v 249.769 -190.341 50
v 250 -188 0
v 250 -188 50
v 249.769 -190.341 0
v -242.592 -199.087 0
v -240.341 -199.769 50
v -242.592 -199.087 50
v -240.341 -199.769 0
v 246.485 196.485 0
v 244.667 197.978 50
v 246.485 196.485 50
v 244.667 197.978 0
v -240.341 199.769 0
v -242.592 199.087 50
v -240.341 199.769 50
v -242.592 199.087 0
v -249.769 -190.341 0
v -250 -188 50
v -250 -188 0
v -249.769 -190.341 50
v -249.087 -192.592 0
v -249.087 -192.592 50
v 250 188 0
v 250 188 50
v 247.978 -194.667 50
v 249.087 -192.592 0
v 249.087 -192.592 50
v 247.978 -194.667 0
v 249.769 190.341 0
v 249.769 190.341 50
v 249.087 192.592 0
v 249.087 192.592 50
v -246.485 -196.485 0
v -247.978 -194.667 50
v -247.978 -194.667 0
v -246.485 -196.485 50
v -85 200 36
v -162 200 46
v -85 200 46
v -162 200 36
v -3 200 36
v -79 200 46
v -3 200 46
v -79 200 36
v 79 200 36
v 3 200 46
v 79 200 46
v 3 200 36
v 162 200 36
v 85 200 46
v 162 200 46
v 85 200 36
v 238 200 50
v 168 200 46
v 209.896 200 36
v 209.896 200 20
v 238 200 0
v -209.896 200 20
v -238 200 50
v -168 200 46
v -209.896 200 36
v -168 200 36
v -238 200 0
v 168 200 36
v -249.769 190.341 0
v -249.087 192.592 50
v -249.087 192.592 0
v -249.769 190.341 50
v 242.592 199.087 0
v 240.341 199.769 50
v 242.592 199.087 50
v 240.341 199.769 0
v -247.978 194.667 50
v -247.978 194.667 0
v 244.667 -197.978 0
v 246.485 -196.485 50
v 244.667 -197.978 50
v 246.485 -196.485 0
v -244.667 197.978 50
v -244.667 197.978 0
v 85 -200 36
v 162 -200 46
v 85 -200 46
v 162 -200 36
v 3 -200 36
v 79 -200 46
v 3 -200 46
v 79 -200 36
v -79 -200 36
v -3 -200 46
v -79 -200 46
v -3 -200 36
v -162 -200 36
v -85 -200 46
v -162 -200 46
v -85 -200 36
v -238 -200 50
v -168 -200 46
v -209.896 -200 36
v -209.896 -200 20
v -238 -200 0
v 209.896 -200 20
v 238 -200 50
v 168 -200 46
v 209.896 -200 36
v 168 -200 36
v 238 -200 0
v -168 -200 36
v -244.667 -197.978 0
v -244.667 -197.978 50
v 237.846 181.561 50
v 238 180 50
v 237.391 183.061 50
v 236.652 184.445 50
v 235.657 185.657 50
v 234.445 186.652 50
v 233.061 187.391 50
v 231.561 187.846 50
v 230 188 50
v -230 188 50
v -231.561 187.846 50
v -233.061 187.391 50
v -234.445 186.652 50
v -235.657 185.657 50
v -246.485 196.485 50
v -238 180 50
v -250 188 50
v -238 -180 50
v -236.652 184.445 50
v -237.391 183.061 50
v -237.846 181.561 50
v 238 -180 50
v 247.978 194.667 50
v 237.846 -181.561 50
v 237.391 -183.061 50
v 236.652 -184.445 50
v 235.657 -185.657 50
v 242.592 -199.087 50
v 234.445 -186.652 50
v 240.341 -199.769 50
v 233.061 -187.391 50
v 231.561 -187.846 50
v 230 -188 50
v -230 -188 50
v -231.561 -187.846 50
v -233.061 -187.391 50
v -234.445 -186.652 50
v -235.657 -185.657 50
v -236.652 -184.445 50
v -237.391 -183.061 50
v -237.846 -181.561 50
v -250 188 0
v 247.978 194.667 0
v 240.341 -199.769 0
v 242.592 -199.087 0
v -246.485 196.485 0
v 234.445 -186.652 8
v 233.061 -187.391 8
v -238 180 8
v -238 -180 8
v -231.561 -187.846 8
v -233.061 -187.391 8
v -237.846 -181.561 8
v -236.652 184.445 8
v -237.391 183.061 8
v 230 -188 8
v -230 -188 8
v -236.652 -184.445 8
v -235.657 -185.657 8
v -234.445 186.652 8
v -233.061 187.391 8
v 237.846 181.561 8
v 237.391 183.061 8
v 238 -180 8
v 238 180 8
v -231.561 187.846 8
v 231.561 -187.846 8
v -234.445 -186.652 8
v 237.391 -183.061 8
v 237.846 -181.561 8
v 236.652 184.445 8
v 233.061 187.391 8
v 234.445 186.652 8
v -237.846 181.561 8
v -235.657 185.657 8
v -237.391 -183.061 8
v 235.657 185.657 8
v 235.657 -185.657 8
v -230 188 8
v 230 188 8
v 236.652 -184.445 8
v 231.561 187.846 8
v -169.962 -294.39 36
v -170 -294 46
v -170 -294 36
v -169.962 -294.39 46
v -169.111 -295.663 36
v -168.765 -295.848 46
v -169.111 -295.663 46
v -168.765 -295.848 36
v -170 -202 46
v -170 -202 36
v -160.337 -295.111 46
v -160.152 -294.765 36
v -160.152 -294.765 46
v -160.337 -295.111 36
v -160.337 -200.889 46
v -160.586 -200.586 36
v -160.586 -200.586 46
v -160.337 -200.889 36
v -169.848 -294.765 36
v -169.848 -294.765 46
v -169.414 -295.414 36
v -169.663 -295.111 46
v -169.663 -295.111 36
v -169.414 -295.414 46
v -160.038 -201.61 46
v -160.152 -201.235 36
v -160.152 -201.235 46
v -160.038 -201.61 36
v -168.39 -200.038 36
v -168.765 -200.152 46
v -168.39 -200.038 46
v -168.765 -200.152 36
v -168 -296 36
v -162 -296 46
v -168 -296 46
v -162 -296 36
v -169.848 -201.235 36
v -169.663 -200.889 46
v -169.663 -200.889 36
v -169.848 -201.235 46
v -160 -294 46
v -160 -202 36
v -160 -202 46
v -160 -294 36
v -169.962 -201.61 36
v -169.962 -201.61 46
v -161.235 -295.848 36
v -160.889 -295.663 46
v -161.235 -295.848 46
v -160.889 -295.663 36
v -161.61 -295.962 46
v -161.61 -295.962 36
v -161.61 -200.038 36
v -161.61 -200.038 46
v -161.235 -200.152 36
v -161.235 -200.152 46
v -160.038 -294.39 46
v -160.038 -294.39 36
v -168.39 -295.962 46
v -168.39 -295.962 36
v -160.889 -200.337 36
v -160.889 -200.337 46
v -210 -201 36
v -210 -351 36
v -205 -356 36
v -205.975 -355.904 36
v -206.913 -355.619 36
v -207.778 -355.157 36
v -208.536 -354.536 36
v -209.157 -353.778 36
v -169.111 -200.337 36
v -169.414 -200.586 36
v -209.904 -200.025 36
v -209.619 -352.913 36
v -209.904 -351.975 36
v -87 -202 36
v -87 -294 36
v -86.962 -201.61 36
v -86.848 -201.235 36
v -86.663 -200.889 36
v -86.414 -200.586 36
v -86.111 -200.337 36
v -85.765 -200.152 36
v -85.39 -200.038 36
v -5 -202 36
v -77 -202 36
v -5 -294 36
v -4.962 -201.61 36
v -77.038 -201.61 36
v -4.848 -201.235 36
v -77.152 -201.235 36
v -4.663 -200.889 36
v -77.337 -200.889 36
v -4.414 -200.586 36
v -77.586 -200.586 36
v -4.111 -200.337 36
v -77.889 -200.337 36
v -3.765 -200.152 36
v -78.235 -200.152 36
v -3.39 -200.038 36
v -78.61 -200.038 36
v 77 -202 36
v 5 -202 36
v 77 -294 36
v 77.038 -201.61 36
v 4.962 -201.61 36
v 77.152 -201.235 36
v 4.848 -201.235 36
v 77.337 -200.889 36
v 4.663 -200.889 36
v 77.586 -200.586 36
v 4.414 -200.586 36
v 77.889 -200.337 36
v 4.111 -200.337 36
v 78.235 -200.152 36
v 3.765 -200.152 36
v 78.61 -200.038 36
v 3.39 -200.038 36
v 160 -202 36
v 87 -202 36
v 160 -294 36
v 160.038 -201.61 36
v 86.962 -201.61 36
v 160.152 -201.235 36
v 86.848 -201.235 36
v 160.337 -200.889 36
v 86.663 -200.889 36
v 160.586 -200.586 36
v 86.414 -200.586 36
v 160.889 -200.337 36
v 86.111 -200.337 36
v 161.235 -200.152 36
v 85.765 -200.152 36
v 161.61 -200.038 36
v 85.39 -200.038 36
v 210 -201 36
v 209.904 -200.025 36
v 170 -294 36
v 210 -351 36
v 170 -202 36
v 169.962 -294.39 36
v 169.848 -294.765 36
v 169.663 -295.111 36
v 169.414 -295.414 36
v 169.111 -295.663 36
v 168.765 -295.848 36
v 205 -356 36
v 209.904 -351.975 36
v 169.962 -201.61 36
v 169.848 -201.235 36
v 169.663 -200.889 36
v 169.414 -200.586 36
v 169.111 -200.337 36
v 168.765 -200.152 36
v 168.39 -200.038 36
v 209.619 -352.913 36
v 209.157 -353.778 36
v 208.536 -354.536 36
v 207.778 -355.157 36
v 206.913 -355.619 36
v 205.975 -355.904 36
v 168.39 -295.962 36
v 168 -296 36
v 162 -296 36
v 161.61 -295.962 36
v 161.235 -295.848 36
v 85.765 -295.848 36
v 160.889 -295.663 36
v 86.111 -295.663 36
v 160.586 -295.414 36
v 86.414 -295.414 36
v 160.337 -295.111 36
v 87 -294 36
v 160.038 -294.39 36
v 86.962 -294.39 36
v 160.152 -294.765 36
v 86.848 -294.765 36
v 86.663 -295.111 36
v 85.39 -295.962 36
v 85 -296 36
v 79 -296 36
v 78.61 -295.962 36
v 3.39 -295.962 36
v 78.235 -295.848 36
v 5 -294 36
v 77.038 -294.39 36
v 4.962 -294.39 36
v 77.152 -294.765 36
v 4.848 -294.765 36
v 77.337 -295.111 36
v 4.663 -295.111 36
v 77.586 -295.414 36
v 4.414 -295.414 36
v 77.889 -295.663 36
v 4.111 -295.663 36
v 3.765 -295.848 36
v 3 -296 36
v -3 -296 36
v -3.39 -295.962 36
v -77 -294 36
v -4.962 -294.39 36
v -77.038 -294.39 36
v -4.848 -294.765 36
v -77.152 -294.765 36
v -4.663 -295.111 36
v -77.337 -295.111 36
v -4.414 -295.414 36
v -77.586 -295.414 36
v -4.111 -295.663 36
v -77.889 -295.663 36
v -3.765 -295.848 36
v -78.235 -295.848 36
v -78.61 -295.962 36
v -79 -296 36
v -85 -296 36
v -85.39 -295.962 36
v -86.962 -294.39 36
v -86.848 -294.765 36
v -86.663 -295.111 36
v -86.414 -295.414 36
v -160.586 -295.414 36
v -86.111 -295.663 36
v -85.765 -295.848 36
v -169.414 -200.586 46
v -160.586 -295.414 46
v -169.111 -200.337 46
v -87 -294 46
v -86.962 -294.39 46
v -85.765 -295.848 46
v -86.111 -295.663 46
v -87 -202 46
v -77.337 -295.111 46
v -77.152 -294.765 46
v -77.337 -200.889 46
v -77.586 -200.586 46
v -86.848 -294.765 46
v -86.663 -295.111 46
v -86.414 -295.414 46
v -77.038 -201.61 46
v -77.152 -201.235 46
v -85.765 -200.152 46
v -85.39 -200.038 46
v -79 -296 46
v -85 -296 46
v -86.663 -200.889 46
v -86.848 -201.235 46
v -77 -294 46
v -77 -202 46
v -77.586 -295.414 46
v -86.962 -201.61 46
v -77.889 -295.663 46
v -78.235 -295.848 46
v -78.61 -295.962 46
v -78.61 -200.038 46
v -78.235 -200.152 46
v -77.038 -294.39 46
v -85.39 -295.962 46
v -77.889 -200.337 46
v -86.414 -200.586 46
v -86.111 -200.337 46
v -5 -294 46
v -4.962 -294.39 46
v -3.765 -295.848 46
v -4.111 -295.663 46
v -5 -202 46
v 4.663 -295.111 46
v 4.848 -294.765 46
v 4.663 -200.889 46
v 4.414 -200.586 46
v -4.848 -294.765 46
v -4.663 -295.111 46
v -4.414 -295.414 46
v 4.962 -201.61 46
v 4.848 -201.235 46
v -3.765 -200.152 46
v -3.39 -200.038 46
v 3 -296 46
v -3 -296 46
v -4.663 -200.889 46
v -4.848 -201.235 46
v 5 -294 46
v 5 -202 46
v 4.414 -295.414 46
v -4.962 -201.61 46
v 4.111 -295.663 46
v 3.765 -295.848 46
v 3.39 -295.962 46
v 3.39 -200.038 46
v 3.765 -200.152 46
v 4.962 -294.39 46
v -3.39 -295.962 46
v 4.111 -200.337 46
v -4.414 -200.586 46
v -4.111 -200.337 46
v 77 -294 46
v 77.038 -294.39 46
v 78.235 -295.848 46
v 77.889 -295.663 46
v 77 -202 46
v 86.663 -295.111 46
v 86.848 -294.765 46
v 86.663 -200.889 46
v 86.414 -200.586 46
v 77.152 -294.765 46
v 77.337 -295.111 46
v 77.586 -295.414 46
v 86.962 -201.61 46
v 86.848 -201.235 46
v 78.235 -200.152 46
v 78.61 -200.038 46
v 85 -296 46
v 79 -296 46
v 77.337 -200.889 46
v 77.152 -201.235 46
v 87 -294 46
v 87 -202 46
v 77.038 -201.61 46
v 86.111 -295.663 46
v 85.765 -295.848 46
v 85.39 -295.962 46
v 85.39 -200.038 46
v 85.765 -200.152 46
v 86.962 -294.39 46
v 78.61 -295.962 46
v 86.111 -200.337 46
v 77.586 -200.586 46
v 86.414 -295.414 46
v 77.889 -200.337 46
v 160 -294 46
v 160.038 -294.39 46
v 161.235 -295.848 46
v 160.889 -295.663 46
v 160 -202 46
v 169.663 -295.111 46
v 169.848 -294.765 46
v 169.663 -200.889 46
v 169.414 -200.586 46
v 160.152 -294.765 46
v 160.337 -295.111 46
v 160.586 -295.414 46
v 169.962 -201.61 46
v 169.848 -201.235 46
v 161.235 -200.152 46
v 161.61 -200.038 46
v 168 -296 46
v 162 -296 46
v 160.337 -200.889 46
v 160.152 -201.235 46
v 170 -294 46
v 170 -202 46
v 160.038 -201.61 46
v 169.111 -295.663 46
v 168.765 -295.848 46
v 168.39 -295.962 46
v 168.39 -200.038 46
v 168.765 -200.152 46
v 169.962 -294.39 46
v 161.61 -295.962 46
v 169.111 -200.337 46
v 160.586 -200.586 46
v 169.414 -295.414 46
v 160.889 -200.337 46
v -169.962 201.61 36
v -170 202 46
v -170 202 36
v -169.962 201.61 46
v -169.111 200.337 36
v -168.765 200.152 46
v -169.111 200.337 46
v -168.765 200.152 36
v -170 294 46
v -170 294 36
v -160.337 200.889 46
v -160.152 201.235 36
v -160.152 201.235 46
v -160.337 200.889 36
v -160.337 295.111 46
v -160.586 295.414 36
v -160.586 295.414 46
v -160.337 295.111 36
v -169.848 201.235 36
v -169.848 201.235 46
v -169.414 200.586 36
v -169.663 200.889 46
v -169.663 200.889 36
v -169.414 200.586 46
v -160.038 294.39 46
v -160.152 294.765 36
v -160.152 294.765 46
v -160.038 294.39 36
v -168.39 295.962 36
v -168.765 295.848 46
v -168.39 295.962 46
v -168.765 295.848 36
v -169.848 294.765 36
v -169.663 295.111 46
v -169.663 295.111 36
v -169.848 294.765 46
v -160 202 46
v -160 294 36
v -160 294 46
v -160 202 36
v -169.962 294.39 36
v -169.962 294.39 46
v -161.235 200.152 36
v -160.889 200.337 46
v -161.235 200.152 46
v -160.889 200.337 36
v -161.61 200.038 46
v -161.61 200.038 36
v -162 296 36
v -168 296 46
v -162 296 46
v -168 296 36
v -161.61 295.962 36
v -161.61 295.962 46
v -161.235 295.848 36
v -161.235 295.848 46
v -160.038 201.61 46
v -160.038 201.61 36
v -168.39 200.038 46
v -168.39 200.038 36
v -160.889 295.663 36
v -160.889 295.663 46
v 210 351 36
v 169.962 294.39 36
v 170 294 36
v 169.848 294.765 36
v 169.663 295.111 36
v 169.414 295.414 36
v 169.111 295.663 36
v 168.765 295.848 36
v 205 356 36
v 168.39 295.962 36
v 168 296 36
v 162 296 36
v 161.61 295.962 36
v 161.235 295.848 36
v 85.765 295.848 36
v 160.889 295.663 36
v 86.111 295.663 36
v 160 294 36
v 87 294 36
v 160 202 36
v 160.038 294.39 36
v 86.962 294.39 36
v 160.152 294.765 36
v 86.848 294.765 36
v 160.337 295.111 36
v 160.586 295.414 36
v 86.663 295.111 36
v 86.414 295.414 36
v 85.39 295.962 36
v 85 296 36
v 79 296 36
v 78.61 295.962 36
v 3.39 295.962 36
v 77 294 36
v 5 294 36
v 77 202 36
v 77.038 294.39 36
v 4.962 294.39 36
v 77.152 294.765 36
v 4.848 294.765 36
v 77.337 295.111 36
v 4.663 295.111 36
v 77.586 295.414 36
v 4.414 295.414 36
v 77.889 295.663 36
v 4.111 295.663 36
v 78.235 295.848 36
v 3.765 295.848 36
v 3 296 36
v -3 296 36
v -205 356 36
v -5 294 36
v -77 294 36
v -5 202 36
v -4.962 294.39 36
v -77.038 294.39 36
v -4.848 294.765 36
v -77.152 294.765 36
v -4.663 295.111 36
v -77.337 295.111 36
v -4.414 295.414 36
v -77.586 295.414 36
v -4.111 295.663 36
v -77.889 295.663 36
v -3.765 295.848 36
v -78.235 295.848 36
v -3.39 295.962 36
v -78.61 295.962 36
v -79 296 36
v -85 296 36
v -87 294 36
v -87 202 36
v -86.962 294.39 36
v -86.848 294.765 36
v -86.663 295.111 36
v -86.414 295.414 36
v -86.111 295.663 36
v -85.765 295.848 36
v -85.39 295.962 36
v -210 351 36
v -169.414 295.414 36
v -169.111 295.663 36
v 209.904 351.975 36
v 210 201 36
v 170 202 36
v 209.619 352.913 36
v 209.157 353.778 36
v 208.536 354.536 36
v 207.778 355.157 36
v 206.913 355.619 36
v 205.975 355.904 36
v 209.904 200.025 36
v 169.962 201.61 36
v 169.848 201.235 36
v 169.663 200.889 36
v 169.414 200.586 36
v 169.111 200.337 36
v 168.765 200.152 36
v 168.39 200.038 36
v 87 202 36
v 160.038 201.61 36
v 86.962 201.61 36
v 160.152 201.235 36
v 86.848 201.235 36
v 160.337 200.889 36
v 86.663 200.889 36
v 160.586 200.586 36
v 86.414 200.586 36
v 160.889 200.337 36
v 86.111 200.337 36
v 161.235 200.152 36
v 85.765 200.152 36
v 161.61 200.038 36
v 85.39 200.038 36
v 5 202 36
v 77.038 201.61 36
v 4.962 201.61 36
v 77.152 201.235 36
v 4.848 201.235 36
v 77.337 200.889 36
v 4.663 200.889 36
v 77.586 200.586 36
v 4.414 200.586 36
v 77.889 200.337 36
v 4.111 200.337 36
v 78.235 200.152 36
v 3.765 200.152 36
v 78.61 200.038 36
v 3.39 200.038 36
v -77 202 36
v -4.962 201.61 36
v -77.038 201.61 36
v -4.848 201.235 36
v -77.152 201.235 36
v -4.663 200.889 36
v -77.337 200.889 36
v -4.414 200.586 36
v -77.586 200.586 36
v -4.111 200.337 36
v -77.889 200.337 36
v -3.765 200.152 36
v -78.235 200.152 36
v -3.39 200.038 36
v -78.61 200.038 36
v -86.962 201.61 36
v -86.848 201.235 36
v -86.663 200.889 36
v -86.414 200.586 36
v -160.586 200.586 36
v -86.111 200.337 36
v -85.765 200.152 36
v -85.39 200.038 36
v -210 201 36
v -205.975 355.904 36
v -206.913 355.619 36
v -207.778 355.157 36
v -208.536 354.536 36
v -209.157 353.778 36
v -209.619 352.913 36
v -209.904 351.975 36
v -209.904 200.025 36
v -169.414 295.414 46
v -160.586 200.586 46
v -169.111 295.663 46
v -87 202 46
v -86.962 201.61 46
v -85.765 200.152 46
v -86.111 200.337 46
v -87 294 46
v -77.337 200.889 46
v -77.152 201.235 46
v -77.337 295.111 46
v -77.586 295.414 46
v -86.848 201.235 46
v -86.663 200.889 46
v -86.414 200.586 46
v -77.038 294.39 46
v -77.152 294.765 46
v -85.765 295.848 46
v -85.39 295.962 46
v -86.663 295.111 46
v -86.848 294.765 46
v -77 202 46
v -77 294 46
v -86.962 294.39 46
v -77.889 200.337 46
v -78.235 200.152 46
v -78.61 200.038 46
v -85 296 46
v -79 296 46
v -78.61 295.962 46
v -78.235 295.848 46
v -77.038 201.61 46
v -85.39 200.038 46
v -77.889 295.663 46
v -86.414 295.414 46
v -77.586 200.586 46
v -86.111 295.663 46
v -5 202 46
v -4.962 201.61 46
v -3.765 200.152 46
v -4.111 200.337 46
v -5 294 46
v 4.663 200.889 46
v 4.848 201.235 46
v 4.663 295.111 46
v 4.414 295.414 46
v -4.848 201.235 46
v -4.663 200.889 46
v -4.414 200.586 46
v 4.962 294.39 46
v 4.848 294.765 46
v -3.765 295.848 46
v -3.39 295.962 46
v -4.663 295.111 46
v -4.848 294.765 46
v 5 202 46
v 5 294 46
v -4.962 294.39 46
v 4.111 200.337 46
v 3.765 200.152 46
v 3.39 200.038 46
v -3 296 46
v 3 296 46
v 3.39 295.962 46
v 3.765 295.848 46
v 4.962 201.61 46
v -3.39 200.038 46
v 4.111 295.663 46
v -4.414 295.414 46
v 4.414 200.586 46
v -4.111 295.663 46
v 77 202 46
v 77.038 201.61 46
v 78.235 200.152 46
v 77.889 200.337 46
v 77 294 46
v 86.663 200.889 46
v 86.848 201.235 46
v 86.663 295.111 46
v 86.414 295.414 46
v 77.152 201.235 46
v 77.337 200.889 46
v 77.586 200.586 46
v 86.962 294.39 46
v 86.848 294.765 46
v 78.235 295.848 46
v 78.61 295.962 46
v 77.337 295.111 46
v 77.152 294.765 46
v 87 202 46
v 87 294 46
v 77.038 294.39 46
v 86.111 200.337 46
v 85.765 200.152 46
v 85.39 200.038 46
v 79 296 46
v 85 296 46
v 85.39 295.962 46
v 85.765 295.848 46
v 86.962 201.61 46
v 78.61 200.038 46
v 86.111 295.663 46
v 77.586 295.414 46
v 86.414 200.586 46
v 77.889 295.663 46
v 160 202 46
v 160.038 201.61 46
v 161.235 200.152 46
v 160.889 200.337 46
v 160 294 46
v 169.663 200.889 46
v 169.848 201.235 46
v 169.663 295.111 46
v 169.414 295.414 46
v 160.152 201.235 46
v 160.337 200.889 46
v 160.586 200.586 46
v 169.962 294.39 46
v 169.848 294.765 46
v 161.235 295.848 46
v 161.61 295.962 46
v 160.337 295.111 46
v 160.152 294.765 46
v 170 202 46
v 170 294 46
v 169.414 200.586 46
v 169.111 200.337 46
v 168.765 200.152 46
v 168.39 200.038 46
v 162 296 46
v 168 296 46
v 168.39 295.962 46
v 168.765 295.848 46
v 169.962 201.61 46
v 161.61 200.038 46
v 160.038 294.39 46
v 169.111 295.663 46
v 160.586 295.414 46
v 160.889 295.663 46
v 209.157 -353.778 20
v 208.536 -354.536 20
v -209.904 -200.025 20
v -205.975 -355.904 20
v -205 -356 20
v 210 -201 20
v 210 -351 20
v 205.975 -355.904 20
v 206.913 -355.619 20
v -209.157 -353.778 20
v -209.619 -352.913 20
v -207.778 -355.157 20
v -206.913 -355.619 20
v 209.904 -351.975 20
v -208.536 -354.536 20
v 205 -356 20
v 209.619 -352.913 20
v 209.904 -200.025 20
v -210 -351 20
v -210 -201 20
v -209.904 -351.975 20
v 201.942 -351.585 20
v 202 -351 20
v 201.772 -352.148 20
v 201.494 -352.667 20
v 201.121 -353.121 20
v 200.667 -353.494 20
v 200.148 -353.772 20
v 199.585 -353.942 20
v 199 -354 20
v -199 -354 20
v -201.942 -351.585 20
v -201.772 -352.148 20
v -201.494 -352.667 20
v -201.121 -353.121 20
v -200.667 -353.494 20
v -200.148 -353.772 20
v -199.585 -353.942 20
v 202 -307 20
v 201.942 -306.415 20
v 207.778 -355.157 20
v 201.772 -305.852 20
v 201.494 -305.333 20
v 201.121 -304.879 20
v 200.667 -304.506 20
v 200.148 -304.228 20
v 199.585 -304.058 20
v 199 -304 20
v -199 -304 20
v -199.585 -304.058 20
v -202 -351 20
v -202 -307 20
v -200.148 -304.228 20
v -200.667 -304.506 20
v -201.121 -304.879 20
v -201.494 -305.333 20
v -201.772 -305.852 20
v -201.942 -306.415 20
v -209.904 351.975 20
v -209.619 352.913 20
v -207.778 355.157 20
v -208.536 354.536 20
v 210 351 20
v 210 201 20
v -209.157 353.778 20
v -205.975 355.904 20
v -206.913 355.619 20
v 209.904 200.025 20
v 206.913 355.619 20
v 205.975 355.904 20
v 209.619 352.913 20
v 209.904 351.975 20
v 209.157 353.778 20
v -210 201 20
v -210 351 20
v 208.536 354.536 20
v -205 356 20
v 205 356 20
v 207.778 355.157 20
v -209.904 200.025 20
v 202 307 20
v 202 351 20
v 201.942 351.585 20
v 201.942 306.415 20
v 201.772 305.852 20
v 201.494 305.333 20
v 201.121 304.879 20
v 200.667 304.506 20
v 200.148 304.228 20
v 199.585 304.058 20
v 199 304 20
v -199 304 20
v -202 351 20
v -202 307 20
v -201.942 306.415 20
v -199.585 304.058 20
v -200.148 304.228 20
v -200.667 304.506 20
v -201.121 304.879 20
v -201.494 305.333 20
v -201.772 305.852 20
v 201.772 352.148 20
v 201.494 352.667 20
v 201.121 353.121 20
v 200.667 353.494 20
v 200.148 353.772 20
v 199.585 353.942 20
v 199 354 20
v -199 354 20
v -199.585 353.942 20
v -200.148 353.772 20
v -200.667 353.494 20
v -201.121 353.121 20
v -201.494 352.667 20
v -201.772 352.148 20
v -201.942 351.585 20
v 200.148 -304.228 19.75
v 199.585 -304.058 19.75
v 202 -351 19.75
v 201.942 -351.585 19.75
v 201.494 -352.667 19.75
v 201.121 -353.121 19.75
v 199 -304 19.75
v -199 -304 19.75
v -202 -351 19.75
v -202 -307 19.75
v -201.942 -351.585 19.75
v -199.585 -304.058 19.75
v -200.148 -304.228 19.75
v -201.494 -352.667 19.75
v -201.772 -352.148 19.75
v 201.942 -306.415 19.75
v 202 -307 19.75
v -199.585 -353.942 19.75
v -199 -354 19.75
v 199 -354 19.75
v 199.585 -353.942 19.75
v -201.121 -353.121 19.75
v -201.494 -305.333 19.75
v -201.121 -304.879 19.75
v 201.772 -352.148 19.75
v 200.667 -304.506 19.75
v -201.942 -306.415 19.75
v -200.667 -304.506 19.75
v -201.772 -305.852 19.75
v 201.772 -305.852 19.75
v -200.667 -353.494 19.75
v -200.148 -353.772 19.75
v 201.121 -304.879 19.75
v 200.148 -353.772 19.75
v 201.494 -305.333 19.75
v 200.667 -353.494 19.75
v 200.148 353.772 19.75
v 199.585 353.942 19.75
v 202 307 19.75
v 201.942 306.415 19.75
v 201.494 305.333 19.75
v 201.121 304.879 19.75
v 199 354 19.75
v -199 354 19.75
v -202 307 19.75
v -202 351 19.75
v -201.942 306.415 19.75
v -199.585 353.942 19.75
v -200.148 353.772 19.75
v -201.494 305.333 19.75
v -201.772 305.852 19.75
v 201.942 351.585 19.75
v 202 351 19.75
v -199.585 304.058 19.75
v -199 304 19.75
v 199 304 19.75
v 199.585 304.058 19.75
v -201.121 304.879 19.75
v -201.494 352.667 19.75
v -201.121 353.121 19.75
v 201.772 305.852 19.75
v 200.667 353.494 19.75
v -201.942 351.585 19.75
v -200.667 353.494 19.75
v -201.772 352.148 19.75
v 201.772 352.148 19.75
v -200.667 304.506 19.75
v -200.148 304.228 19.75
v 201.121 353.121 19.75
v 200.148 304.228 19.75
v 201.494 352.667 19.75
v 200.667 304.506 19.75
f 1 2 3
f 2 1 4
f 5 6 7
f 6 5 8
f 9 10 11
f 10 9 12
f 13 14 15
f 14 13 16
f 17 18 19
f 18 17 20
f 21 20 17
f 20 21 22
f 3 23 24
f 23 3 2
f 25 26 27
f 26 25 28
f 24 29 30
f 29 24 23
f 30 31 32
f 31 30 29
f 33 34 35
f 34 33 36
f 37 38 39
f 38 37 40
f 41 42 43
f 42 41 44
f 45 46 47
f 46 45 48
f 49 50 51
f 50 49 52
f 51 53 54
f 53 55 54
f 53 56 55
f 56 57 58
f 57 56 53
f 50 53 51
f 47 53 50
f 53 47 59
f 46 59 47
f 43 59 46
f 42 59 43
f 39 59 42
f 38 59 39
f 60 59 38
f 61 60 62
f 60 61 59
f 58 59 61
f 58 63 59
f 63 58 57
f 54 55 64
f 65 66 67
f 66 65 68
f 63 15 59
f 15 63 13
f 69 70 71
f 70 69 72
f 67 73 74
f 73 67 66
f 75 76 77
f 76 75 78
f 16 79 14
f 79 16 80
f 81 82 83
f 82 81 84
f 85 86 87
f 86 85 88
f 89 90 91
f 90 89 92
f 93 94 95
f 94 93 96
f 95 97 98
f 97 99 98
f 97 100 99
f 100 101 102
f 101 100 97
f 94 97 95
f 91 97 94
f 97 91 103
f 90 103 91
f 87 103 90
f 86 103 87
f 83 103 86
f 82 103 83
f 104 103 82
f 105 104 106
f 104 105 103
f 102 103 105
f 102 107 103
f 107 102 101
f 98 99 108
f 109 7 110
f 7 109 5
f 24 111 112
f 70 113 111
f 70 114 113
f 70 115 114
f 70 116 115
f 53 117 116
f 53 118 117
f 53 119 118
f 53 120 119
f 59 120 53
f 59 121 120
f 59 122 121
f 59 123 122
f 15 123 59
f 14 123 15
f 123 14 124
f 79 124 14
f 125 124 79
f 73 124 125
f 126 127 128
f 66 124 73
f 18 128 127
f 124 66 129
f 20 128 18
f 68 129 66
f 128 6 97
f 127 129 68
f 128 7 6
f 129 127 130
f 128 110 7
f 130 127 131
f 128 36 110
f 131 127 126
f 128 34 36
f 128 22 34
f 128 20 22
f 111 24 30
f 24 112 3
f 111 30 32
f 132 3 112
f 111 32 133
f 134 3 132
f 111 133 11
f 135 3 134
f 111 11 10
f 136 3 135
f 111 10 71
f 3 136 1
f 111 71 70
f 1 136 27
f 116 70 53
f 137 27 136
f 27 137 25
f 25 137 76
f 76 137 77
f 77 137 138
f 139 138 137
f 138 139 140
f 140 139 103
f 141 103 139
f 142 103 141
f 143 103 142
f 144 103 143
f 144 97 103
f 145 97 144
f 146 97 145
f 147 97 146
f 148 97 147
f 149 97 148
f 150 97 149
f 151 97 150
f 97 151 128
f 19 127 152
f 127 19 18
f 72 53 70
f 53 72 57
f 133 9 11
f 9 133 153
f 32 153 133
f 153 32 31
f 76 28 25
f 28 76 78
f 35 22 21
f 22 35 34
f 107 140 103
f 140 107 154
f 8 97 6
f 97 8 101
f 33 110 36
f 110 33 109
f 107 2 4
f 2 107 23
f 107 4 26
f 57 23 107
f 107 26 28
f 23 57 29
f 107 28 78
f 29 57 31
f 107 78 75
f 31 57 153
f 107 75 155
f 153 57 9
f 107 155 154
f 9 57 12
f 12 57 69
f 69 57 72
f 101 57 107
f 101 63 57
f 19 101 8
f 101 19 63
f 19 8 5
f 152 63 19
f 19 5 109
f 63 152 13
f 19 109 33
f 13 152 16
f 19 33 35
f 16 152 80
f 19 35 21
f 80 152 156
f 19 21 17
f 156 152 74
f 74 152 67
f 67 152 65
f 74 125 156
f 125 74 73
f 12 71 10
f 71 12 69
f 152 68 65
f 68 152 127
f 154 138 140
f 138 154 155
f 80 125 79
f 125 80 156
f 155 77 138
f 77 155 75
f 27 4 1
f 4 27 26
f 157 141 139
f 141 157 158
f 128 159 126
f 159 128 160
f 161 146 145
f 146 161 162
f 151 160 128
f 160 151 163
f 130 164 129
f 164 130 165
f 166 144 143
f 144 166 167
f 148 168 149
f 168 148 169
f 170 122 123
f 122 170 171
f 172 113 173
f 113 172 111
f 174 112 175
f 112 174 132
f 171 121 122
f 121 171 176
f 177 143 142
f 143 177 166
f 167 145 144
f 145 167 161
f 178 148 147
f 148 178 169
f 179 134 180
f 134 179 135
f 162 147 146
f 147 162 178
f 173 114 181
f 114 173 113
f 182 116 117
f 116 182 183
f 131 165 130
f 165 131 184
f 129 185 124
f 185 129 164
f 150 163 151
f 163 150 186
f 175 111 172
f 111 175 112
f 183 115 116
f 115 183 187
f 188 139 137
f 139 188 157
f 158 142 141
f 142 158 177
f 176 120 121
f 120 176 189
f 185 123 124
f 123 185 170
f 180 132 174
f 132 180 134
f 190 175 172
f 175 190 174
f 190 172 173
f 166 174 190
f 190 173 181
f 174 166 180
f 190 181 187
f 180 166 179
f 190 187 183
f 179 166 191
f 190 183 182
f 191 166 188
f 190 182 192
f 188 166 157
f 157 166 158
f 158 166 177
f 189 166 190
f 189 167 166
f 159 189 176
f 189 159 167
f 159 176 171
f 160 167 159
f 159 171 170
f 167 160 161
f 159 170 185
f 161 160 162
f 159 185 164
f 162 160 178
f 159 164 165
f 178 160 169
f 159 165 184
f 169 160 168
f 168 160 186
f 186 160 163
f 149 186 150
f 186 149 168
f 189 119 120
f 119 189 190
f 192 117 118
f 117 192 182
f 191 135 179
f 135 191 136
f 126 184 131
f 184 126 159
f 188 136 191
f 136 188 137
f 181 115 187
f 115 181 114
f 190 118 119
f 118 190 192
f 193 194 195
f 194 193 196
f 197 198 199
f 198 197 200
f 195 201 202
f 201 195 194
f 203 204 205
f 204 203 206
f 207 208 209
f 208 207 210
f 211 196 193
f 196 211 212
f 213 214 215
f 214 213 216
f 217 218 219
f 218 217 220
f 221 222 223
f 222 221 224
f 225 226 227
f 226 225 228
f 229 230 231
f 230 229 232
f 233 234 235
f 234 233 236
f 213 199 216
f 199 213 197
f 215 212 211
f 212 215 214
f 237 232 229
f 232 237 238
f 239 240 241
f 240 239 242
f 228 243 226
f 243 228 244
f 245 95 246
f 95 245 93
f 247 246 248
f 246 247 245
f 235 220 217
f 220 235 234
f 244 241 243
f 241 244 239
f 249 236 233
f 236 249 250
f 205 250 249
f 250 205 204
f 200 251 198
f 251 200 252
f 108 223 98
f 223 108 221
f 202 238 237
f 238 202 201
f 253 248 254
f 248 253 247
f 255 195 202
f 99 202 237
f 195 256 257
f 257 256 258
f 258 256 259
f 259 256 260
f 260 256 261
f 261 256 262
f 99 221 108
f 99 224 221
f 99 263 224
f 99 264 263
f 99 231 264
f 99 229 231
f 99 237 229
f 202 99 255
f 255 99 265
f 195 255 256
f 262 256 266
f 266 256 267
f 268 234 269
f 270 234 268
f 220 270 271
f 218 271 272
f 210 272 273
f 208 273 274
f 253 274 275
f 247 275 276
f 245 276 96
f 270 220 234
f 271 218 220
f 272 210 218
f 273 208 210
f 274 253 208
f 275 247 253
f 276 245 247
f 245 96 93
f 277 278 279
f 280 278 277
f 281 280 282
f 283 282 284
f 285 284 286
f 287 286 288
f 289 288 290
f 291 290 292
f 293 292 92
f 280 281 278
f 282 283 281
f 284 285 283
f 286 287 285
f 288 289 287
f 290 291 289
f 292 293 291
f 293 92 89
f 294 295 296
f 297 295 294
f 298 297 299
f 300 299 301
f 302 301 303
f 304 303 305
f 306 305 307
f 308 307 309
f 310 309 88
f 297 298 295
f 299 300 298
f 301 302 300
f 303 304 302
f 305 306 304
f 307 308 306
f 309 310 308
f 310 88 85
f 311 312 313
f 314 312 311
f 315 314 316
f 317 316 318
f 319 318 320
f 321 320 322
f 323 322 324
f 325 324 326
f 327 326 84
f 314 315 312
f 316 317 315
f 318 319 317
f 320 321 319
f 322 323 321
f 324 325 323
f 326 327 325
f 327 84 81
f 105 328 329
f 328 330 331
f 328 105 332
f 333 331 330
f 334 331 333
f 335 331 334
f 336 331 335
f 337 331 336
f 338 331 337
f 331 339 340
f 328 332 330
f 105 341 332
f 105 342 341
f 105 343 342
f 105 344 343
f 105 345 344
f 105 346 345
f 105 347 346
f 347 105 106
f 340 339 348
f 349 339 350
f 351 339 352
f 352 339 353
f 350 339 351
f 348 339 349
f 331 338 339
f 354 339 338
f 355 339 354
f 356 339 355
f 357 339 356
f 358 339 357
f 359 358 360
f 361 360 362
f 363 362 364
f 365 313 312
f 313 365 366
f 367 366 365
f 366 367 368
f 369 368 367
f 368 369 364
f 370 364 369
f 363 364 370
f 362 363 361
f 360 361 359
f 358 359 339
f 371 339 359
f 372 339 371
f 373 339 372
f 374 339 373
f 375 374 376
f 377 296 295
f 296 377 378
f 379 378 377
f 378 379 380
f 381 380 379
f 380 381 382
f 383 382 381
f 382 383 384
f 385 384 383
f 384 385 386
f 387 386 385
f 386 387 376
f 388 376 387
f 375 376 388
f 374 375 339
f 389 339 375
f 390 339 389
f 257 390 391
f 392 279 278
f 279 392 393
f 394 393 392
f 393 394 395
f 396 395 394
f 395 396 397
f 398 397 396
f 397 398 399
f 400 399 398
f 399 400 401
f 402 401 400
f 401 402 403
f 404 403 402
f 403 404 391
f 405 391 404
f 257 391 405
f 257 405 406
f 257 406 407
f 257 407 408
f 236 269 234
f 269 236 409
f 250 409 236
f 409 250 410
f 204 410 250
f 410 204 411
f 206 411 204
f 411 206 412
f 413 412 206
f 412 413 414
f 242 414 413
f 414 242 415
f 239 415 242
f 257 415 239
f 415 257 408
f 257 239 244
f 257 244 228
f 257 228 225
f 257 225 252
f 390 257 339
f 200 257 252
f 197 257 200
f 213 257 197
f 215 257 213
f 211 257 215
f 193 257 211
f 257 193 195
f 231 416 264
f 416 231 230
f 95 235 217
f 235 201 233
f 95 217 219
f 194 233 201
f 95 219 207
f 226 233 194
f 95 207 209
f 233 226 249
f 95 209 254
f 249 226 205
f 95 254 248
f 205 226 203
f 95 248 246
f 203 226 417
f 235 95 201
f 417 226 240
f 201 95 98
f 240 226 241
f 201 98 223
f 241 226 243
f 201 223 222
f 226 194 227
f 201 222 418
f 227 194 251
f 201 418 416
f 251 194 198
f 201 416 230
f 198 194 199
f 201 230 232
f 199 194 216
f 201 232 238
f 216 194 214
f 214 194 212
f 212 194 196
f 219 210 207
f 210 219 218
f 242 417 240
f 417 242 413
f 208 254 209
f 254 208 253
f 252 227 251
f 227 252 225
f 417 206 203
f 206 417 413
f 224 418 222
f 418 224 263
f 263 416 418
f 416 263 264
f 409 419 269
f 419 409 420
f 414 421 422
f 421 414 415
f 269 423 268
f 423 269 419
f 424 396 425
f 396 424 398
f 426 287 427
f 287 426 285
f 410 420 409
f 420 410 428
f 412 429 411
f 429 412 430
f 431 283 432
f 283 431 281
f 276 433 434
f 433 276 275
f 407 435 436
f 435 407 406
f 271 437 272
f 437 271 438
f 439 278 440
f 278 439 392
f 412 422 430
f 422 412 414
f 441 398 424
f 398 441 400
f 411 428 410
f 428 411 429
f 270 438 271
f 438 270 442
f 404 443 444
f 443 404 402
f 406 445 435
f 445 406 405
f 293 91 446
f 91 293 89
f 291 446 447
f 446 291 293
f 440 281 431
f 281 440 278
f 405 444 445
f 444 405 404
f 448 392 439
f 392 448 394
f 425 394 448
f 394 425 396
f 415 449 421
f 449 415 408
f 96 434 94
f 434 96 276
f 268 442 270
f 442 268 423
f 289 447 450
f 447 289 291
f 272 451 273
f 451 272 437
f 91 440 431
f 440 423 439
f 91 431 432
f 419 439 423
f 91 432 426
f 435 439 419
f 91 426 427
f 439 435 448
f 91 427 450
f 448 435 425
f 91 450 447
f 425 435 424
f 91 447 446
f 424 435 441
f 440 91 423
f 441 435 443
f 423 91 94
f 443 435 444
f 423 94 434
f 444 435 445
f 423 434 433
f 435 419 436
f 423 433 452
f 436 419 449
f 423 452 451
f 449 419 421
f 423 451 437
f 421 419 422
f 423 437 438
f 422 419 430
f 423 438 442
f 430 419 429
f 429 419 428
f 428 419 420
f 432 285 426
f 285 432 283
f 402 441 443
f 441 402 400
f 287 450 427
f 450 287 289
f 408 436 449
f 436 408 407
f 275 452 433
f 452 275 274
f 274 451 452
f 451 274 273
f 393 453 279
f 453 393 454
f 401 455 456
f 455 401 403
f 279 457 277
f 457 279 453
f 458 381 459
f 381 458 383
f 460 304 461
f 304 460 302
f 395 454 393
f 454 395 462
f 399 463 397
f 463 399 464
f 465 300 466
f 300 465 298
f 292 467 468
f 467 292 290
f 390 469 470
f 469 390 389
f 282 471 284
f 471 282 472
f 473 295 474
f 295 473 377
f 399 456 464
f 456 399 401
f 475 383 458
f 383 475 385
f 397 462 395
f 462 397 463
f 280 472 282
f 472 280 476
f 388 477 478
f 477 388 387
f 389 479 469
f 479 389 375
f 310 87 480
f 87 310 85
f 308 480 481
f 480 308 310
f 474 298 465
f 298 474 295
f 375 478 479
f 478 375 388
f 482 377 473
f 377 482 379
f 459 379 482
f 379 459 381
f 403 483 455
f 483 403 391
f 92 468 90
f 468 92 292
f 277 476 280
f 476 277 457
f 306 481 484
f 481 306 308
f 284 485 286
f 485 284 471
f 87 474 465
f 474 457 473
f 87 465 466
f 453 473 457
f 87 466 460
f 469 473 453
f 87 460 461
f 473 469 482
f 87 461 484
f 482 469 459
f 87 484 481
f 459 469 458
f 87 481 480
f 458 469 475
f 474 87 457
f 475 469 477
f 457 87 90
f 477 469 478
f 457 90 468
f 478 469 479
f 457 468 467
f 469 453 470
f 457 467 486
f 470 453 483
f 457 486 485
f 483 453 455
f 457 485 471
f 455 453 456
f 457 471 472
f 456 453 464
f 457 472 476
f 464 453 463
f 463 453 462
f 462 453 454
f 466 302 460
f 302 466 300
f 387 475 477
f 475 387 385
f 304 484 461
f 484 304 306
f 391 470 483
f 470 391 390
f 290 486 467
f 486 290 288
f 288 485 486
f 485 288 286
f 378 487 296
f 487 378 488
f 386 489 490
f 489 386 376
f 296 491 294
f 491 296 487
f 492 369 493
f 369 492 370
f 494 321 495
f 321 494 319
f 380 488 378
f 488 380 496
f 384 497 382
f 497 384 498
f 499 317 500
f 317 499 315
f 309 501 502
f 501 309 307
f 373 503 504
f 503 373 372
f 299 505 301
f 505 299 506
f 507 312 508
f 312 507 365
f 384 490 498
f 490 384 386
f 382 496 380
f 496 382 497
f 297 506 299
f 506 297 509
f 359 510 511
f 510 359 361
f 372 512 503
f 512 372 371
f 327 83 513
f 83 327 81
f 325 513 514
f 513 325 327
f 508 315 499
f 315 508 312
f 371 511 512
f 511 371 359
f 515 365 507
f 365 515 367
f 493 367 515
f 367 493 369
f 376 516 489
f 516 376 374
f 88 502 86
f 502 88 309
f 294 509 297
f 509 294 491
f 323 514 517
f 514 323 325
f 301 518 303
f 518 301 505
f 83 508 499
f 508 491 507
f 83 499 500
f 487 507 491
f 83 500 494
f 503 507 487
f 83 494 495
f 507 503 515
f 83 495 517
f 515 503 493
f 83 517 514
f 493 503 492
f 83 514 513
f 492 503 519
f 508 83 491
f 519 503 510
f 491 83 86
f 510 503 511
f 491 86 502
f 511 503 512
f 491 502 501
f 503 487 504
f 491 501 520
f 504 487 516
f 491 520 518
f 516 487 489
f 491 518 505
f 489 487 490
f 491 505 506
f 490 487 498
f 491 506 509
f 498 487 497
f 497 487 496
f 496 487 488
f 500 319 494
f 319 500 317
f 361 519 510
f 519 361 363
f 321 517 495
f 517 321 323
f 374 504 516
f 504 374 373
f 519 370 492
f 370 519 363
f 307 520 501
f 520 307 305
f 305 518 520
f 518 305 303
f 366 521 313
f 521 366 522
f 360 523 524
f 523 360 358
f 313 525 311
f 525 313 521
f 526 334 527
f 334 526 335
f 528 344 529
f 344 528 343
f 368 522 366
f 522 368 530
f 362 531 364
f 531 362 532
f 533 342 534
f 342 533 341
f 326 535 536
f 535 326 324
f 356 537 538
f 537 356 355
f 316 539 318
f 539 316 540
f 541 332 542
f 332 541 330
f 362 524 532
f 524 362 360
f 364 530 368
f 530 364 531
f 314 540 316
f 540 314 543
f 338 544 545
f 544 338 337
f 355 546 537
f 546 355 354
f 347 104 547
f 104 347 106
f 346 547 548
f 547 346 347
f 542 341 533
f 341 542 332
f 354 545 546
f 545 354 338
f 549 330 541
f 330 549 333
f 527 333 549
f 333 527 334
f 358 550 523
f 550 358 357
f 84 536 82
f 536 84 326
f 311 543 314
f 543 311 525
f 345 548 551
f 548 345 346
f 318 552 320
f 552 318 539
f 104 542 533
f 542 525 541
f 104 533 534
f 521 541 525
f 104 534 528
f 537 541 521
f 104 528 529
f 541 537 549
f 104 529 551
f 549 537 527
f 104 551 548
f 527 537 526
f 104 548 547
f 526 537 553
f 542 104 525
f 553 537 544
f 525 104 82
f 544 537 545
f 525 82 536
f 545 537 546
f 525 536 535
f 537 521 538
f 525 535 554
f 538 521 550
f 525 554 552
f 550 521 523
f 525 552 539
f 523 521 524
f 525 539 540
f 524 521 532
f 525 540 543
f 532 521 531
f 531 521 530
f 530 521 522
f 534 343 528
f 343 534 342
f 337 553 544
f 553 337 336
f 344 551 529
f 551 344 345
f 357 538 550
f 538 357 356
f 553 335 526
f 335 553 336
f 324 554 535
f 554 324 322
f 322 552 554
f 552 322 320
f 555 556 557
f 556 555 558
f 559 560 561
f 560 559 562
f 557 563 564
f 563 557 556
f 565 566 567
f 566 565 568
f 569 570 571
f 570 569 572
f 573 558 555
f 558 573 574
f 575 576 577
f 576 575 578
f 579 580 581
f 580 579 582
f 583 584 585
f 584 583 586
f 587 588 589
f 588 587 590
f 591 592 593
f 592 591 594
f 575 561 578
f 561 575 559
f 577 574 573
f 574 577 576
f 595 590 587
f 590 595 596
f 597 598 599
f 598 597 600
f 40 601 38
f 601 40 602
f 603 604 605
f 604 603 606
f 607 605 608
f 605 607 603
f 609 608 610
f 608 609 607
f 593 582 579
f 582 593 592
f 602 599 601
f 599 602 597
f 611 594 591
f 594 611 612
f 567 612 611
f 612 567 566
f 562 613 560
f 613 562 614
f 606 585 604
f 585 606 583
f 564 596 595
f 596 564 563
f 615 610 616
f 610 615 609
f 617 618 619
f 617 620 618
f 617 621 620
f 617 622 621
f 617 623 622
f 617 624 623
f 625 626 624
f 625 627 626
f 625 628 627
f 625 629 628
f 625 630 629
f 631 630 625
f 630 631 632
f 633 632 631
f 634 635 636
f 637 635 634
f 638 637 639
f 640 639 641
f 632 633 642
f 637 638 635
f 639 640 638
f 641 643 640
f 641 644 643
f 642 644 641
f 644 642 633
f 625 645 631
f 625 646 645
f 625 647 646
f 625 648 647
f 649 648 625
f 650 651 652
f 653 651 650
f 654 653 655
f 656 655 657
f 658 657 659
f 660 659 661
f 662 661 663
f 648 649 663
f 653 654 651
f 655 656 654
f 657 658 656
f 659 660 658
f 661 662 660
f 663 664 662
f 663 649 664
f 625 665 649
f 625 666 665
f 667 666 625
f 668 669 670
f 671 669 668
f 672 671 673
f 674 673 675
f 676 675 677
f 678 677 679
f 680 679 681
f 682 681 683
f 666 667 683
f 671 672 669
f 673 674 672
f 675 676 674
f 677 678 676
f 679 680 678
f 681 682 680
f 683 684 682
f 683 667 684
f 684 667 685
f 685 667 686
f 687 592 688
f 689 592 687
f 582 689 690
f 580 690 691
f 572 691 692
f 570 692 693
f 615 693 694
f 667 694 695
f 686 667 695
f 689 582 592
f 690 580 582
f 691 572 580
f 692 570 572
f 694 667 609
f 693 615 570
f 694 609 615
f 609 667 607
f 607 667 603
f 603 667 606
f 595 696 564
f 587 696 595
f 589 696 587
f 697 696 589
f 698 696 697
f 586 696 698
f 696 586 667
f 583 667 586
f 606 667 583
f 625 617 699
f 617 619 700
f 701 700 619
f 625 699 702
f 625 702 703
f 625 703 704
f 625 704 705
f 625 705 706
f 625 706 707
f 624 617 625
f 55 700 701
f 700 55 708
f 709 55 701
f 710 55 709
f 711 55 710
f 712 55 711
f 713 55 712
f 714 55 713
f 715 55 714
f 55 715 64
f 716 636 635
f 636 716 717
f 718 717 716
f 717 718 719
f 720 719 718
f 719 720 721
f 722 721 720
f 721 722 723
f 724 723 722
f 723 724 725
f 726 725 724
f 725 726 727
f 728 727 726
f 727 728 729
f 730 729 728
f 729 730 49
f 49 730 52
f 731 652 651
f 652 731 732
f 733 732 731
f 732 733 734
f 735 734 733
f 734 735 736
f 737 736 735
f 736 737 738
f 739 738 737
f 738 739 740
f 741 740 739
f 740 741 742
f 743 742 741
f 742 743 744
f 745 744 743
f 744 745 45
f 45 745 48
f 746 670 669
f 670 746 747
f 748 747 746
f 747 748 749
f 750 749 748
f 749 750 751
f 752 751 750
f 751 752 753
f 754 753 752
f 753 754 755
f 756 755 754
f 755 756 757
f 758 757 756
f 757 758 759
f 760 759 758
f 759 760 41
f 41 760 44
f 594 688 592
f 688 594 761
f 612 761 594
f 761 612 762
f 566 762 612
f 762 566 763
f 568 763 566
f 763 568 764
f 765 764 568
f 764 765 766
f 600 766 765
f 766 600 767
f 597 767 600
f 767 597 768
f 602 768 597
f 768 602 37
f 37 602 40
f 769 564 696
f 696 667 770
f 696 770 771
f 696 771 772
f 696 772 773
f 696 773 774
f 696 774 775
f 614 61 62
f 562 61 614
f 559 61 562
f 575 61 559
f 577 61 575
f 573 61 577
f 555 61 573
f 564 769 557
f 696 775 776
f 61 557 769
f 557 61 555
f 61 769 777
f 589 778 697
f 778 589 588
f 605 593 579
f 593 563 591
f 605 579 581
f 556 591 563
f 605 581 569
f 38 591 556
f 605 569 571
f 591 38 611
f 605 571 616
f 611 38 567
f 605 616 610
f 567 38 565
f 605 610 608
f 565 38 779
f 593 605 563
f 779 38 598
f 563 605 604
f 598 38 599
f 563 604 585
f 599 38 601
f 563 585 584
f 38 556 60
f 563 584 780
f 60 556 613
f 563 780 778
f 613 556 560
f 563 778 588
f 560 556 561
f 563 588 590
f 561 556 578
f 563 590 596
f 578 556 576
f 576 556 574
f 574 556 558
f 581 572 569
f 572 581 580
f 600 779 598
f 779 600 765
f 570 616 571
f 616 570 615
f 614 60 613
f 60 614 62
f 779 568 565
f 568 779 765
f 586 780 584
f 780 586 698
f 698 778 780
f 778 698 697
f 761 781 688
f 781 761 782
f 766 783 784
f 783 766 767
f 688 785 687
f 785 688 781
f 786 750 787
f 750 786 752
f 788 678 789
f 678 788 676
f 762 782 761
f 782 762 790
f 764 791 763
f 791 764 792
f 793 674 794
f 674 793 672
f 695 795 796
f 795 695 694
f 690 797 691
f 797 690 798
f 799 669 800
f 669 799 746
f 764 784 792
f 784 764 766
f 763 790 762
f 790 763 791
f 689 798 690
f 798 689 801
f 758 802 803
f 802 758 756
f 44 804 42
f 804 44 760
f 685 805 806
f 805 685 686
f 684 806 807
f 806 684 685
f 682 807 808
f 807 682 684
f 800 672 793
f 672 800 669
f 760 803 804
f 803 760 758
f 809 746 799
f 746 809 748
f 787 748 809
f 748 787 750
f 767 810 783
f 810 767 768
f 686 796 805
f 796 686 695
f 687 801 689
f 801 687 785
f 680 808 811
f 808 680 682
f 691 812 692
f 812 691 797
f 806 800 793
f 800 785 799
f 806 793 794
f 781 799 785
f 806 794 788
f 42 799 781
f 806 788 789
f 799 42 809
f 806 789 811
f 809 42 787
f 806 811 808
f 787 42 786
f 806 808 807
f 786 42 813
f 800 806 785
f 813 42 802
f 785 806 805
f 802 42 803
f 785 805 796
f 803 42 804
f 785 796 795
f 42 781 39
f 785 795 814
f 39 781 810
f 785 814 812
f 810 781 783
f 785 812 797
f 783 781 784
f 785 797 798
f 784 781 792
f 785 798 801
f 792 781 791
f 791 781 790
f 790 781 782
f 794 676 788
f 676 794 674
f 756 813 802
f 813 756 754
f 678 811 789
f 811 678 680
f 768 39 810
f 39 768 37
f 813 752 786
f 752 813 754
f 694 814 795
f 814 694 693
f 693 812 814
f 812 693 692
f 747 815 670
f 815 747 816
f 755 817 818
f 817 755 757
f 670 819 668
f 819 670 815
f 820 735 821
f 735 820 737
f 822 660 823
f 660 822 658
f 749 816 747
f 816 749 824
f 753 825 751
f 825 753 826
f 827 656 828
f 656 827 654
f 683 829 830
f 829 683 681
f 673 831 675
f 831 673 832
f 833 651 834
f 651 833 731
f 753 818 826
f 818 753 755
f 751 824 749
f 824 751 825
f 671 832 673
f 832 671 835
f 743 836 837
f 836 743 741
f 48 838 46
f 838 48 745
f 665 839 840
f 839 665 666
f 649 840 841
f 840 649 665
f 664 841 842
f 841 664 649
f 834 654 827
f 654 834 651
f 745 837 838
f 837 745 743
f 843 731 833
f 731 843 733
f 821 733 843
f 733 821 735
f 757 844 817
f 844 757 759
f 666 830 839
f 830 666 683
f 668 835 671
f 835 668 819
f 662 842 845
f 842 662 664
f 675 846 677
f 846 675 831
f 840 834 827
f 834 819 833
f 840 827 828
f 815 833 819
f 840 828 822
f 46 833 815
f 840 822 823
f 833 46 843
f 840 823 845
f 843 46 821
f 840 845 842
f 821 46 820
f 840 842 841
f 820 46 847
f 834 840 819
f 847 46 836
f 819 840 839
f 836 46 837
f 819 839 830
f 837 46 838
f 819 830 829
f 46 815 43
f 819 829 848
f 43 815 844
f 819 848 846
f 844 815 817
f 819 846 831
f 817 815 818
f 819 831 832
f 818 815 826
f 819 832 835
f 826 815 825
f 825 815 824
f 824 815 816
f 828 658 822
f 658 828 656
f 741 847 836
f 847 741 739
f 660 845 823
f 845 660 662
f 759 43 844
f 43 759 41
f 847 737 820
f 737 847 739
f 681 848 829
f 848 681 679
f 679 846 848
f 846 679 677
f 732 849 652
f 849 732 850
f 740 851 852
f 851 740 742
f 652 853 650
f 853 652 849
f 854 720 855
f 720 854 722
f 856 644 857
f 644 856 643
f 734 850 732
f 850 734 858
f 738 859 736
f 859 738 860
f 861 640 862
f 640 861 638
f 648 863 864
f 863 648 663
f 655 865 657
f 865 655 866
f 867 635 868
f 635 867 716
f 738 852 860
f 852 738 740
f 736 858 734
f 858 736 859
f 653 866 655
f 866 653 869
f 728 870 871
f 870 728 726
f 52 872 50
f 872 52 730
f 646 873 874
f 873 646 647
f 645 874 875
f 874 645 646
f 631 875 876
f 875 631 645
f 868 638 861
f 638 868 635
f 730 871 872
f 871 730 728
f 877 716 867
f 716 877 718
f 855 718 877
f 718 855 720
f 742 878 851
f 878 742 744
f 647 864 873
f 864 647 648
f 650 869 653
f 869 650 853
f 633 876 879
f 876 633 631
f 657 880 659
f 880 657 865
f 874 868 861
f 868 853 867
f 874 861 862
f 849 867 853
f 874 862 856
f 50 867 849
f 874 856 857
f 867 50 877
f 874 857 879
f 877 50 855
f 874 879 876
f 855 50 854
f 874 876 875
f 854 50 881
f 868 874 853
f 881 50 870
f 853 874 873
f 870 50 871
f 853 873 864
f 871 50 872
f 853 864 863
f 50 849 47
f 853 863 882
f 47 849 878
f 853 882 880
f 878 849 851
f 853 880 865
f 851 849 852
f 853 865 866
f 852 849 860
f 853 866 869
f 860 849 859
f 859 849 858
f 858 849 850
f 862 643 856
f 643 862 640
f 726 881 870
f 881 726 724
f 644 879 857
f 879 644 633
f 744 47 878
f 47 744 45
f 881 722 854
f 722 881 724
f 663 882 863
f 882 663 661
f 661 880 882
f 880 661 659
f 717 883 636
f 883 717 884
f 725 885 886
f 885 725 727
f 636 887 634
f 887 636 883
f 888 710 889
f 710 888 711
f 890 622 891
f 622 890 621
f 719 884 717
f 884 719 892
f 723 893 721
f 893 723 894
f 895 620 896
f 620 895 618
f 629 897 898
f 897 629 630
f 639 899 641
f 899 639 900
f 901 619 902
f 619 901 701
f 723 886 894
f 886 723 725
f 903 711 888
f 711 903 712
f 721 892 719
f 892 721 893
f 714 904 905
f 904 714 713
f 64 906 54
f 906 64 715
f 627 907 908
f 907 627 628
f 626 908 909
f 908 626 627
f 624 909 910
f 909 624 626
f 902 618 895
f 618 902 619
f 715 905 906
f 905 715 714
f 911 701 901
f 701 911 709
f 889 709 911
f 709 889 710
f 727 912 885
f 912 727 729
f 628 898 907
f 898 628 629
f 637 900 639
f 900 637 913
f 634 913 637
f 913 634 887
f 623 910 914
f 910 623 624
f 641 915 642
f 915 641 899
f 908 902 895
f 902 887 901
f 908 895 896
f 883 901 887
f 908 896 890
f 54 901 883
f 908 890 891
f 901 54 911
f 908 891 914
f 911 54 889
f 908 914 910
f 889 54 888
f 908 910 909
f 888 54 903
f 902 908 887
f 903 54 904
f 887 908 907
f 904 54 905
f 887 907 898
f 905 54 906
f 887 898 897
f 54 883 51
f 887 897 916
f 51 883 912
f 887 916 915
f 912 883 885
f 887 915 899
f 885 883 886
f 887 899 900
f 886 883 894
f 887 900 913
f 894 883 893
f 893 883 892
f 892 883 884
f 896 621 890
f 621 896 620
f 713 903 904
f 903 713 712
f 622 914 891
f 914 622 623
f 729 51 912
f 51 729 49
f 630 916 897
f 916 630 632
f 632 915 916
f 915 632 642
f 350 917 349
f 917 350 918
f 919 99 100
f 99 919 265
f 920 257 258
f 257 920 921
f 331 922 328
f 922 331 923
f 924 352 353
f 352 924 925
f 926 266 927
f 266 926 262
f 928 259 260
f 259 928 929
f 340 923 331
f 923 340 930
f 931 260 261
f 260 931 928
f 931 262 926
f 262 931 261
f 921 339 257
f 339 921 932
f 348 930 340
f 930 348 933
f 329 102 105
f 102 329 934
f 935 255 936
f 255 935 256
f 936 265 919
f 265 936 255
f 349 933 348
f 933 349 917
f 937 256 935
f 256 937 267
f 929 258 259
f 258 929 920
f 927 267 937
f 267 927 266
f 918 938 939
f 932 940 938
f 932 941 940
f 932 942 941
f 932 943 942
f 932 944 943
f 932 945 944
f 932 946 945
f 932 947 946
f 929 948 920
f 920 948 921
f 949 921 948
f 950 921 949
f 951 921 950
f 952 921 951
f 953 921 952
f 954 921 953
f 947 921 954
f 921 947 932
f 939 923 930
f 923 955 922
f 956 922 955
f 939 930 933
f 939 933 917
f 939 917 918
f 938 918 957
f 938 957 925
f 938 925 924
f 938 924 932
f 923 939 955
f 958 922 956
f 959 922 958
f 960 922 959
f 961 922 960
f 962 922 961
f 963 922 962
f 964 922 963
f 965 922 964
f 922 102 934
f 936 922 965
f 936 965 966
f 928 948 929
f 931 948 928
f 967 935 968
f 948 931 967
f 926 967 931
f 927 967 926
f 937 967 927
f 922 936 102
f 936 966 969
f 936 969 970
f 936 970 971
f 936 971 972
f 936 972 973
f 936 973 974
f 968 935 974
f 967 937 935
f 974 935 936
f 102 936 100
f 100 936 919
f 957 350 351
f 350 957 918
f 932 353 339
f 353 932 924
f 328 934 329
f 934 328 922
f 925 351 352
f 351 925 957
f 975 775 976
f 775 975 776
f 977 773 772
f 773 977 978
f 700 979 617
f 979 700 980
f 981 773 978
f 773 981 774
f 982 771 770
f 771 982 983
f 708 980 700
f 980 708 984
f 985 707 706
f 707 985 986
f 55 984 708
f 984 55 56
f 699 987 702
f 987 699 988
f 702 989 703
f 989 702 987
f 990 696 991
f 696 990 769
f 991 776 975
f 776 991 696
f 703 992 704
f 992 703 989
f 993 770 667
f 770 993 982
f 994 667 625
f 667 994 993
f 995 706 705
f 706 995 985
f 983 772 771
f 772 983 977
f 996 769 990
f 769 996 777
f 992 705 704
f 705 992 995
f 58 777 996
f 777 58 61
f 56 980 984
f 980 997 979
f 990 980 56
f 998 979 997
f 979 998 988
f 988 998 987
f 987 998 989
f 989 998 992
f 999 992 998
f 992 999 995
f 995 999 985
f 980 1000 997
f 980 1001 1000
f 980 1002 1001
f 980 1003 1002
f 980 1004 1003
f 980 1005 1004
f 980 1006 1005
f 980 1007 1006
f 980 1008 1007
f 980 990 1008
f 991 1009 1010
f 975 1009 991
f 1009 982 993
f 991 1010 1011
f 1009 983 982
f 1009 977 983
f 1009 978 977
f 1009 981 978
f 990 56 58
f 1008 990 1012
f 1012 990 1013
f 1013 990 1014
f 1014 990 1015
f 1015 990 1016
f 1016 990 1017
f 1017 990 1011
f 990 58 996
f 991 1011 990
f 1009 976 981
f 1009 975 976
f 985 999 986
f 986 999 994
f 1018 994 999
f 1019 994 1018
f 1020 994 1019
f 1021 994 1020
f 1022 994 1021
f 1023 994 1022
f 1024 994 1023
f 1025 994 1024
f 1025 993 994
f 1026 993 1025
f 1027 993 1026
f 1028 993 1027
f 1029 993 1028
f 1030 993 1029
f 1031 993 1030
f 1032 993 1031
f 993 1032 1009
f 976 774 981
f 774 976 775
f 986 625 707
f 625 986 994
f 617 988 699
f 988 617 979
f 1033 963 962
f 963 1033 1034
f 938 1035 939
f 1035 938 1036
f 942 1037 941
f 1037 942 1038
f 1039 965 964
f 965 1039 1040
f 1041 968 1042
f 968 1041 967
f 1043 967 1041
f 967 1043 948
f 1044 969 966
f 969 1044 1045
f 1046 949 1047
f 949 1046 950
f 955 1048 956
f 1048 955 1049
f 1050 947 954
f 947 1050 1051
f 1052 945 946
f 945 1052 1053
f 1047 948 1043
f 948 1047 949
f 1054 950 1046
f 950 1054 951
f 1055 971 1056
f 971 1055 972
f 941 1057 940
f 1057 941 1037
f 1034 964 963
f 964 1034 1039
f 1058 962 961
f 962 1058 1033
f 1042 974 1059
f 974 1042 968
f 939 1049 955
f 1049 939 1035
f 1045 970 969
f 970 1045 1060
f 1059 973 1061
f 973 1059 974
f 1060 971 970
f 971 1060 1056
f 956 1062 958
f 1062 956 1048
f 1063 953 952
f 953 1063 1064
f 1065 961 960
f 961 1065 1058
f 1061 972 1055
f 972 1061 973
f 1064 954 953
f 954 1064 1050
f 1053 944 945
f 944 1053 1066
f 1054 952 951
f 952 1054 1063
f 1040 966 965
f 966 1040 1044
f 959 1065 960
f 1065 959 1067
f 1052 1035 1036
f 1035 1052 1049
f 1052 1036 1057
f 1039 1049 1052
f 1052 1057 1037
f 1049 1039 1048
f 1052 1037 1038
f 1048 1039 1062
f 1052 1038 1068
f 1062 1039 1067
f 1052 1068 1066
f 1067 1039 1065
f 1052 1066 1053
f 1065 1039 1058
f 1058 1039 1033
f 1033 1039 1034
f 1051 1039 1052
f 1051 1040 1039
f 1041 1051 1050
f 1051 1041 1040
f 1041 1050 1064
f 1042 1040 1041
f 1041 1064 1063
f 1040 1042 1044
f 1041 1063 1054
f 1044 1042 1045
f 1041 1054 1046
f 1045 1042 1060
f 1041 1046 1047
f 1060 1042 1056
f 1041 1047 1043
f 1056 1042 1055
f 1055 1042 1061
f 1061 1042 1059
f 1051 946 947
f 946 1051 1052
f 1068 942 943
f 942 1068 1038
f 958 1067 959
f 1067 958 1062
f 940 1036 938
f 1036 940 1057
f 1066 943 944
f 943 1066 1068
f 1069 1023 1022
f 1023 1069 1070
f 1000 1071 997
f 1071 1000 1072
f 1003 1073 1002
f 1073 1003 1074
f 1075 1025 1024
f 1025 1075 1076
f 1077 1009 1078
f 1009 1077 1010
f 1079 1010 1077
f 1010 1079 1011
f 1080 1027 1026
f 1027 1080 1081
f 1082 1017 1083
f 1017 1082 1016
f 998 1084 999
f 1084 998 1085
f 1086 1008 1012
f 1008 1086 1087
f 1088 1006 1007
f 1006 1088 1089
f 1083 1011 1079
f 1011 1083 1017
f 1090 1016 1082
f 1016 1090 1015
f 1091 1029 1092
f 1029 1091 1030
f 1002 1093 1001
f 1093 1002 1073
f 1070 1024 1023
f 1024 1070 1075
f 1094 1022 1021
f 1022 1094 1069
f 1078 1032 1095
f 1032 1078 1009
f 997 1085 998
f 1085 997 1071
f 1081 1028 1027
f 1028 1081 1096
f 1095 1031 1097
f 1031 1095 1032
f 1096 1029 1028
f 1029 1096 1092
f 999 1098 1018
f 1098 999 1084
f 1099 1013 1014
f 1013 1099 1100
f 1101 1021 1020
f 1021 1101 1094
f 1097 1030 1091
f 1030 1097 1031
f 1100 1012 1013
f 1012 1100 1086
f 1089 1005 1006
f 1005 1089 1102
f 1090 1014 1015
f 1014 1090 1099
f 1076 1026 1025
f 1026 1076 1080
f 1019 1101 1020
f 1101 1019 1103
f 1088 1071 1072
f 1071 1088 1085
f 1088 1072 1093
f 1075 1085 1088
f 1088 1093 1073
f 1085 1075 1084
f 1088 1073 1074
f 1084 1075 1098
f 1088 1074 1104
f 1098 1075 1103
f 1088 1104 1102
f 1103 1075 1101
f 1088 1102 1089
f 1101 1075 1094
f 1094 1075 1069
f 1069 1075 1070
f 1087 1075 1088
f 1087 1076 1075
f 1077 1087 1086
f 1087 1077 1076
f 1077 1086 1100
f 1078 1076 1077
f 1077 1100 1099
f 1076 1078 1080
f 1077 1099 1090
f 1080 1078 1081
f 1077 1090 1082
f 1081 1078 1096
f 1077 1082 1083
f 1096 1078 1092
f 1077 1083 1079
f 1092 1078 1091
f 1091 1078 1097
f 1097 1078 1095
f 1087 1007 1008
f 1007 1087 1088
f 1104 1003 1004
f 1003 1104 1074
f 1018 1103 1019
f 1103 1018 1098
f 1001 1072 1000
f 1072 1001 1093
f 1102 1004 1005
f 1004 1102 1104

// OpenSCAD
use <main.scad>
lift_center_x            = -15;
lift_lowered_deck_z      = 330;
payload_box_length       = 500;
payload_box_width        = 400;
payload_box_height       = 50;
rack_tray_wing_span_y    = 156;
rack_tray_wing_length    = 420;
rack_tray_wing_thickness = 16;
rack_tray_wing_z_offset  = 20;
show_component_labels    = false;
translate([-lift_center_x, 0, -(lift_lowered_deck_z + 2)])
    payload_tray_body(0);
